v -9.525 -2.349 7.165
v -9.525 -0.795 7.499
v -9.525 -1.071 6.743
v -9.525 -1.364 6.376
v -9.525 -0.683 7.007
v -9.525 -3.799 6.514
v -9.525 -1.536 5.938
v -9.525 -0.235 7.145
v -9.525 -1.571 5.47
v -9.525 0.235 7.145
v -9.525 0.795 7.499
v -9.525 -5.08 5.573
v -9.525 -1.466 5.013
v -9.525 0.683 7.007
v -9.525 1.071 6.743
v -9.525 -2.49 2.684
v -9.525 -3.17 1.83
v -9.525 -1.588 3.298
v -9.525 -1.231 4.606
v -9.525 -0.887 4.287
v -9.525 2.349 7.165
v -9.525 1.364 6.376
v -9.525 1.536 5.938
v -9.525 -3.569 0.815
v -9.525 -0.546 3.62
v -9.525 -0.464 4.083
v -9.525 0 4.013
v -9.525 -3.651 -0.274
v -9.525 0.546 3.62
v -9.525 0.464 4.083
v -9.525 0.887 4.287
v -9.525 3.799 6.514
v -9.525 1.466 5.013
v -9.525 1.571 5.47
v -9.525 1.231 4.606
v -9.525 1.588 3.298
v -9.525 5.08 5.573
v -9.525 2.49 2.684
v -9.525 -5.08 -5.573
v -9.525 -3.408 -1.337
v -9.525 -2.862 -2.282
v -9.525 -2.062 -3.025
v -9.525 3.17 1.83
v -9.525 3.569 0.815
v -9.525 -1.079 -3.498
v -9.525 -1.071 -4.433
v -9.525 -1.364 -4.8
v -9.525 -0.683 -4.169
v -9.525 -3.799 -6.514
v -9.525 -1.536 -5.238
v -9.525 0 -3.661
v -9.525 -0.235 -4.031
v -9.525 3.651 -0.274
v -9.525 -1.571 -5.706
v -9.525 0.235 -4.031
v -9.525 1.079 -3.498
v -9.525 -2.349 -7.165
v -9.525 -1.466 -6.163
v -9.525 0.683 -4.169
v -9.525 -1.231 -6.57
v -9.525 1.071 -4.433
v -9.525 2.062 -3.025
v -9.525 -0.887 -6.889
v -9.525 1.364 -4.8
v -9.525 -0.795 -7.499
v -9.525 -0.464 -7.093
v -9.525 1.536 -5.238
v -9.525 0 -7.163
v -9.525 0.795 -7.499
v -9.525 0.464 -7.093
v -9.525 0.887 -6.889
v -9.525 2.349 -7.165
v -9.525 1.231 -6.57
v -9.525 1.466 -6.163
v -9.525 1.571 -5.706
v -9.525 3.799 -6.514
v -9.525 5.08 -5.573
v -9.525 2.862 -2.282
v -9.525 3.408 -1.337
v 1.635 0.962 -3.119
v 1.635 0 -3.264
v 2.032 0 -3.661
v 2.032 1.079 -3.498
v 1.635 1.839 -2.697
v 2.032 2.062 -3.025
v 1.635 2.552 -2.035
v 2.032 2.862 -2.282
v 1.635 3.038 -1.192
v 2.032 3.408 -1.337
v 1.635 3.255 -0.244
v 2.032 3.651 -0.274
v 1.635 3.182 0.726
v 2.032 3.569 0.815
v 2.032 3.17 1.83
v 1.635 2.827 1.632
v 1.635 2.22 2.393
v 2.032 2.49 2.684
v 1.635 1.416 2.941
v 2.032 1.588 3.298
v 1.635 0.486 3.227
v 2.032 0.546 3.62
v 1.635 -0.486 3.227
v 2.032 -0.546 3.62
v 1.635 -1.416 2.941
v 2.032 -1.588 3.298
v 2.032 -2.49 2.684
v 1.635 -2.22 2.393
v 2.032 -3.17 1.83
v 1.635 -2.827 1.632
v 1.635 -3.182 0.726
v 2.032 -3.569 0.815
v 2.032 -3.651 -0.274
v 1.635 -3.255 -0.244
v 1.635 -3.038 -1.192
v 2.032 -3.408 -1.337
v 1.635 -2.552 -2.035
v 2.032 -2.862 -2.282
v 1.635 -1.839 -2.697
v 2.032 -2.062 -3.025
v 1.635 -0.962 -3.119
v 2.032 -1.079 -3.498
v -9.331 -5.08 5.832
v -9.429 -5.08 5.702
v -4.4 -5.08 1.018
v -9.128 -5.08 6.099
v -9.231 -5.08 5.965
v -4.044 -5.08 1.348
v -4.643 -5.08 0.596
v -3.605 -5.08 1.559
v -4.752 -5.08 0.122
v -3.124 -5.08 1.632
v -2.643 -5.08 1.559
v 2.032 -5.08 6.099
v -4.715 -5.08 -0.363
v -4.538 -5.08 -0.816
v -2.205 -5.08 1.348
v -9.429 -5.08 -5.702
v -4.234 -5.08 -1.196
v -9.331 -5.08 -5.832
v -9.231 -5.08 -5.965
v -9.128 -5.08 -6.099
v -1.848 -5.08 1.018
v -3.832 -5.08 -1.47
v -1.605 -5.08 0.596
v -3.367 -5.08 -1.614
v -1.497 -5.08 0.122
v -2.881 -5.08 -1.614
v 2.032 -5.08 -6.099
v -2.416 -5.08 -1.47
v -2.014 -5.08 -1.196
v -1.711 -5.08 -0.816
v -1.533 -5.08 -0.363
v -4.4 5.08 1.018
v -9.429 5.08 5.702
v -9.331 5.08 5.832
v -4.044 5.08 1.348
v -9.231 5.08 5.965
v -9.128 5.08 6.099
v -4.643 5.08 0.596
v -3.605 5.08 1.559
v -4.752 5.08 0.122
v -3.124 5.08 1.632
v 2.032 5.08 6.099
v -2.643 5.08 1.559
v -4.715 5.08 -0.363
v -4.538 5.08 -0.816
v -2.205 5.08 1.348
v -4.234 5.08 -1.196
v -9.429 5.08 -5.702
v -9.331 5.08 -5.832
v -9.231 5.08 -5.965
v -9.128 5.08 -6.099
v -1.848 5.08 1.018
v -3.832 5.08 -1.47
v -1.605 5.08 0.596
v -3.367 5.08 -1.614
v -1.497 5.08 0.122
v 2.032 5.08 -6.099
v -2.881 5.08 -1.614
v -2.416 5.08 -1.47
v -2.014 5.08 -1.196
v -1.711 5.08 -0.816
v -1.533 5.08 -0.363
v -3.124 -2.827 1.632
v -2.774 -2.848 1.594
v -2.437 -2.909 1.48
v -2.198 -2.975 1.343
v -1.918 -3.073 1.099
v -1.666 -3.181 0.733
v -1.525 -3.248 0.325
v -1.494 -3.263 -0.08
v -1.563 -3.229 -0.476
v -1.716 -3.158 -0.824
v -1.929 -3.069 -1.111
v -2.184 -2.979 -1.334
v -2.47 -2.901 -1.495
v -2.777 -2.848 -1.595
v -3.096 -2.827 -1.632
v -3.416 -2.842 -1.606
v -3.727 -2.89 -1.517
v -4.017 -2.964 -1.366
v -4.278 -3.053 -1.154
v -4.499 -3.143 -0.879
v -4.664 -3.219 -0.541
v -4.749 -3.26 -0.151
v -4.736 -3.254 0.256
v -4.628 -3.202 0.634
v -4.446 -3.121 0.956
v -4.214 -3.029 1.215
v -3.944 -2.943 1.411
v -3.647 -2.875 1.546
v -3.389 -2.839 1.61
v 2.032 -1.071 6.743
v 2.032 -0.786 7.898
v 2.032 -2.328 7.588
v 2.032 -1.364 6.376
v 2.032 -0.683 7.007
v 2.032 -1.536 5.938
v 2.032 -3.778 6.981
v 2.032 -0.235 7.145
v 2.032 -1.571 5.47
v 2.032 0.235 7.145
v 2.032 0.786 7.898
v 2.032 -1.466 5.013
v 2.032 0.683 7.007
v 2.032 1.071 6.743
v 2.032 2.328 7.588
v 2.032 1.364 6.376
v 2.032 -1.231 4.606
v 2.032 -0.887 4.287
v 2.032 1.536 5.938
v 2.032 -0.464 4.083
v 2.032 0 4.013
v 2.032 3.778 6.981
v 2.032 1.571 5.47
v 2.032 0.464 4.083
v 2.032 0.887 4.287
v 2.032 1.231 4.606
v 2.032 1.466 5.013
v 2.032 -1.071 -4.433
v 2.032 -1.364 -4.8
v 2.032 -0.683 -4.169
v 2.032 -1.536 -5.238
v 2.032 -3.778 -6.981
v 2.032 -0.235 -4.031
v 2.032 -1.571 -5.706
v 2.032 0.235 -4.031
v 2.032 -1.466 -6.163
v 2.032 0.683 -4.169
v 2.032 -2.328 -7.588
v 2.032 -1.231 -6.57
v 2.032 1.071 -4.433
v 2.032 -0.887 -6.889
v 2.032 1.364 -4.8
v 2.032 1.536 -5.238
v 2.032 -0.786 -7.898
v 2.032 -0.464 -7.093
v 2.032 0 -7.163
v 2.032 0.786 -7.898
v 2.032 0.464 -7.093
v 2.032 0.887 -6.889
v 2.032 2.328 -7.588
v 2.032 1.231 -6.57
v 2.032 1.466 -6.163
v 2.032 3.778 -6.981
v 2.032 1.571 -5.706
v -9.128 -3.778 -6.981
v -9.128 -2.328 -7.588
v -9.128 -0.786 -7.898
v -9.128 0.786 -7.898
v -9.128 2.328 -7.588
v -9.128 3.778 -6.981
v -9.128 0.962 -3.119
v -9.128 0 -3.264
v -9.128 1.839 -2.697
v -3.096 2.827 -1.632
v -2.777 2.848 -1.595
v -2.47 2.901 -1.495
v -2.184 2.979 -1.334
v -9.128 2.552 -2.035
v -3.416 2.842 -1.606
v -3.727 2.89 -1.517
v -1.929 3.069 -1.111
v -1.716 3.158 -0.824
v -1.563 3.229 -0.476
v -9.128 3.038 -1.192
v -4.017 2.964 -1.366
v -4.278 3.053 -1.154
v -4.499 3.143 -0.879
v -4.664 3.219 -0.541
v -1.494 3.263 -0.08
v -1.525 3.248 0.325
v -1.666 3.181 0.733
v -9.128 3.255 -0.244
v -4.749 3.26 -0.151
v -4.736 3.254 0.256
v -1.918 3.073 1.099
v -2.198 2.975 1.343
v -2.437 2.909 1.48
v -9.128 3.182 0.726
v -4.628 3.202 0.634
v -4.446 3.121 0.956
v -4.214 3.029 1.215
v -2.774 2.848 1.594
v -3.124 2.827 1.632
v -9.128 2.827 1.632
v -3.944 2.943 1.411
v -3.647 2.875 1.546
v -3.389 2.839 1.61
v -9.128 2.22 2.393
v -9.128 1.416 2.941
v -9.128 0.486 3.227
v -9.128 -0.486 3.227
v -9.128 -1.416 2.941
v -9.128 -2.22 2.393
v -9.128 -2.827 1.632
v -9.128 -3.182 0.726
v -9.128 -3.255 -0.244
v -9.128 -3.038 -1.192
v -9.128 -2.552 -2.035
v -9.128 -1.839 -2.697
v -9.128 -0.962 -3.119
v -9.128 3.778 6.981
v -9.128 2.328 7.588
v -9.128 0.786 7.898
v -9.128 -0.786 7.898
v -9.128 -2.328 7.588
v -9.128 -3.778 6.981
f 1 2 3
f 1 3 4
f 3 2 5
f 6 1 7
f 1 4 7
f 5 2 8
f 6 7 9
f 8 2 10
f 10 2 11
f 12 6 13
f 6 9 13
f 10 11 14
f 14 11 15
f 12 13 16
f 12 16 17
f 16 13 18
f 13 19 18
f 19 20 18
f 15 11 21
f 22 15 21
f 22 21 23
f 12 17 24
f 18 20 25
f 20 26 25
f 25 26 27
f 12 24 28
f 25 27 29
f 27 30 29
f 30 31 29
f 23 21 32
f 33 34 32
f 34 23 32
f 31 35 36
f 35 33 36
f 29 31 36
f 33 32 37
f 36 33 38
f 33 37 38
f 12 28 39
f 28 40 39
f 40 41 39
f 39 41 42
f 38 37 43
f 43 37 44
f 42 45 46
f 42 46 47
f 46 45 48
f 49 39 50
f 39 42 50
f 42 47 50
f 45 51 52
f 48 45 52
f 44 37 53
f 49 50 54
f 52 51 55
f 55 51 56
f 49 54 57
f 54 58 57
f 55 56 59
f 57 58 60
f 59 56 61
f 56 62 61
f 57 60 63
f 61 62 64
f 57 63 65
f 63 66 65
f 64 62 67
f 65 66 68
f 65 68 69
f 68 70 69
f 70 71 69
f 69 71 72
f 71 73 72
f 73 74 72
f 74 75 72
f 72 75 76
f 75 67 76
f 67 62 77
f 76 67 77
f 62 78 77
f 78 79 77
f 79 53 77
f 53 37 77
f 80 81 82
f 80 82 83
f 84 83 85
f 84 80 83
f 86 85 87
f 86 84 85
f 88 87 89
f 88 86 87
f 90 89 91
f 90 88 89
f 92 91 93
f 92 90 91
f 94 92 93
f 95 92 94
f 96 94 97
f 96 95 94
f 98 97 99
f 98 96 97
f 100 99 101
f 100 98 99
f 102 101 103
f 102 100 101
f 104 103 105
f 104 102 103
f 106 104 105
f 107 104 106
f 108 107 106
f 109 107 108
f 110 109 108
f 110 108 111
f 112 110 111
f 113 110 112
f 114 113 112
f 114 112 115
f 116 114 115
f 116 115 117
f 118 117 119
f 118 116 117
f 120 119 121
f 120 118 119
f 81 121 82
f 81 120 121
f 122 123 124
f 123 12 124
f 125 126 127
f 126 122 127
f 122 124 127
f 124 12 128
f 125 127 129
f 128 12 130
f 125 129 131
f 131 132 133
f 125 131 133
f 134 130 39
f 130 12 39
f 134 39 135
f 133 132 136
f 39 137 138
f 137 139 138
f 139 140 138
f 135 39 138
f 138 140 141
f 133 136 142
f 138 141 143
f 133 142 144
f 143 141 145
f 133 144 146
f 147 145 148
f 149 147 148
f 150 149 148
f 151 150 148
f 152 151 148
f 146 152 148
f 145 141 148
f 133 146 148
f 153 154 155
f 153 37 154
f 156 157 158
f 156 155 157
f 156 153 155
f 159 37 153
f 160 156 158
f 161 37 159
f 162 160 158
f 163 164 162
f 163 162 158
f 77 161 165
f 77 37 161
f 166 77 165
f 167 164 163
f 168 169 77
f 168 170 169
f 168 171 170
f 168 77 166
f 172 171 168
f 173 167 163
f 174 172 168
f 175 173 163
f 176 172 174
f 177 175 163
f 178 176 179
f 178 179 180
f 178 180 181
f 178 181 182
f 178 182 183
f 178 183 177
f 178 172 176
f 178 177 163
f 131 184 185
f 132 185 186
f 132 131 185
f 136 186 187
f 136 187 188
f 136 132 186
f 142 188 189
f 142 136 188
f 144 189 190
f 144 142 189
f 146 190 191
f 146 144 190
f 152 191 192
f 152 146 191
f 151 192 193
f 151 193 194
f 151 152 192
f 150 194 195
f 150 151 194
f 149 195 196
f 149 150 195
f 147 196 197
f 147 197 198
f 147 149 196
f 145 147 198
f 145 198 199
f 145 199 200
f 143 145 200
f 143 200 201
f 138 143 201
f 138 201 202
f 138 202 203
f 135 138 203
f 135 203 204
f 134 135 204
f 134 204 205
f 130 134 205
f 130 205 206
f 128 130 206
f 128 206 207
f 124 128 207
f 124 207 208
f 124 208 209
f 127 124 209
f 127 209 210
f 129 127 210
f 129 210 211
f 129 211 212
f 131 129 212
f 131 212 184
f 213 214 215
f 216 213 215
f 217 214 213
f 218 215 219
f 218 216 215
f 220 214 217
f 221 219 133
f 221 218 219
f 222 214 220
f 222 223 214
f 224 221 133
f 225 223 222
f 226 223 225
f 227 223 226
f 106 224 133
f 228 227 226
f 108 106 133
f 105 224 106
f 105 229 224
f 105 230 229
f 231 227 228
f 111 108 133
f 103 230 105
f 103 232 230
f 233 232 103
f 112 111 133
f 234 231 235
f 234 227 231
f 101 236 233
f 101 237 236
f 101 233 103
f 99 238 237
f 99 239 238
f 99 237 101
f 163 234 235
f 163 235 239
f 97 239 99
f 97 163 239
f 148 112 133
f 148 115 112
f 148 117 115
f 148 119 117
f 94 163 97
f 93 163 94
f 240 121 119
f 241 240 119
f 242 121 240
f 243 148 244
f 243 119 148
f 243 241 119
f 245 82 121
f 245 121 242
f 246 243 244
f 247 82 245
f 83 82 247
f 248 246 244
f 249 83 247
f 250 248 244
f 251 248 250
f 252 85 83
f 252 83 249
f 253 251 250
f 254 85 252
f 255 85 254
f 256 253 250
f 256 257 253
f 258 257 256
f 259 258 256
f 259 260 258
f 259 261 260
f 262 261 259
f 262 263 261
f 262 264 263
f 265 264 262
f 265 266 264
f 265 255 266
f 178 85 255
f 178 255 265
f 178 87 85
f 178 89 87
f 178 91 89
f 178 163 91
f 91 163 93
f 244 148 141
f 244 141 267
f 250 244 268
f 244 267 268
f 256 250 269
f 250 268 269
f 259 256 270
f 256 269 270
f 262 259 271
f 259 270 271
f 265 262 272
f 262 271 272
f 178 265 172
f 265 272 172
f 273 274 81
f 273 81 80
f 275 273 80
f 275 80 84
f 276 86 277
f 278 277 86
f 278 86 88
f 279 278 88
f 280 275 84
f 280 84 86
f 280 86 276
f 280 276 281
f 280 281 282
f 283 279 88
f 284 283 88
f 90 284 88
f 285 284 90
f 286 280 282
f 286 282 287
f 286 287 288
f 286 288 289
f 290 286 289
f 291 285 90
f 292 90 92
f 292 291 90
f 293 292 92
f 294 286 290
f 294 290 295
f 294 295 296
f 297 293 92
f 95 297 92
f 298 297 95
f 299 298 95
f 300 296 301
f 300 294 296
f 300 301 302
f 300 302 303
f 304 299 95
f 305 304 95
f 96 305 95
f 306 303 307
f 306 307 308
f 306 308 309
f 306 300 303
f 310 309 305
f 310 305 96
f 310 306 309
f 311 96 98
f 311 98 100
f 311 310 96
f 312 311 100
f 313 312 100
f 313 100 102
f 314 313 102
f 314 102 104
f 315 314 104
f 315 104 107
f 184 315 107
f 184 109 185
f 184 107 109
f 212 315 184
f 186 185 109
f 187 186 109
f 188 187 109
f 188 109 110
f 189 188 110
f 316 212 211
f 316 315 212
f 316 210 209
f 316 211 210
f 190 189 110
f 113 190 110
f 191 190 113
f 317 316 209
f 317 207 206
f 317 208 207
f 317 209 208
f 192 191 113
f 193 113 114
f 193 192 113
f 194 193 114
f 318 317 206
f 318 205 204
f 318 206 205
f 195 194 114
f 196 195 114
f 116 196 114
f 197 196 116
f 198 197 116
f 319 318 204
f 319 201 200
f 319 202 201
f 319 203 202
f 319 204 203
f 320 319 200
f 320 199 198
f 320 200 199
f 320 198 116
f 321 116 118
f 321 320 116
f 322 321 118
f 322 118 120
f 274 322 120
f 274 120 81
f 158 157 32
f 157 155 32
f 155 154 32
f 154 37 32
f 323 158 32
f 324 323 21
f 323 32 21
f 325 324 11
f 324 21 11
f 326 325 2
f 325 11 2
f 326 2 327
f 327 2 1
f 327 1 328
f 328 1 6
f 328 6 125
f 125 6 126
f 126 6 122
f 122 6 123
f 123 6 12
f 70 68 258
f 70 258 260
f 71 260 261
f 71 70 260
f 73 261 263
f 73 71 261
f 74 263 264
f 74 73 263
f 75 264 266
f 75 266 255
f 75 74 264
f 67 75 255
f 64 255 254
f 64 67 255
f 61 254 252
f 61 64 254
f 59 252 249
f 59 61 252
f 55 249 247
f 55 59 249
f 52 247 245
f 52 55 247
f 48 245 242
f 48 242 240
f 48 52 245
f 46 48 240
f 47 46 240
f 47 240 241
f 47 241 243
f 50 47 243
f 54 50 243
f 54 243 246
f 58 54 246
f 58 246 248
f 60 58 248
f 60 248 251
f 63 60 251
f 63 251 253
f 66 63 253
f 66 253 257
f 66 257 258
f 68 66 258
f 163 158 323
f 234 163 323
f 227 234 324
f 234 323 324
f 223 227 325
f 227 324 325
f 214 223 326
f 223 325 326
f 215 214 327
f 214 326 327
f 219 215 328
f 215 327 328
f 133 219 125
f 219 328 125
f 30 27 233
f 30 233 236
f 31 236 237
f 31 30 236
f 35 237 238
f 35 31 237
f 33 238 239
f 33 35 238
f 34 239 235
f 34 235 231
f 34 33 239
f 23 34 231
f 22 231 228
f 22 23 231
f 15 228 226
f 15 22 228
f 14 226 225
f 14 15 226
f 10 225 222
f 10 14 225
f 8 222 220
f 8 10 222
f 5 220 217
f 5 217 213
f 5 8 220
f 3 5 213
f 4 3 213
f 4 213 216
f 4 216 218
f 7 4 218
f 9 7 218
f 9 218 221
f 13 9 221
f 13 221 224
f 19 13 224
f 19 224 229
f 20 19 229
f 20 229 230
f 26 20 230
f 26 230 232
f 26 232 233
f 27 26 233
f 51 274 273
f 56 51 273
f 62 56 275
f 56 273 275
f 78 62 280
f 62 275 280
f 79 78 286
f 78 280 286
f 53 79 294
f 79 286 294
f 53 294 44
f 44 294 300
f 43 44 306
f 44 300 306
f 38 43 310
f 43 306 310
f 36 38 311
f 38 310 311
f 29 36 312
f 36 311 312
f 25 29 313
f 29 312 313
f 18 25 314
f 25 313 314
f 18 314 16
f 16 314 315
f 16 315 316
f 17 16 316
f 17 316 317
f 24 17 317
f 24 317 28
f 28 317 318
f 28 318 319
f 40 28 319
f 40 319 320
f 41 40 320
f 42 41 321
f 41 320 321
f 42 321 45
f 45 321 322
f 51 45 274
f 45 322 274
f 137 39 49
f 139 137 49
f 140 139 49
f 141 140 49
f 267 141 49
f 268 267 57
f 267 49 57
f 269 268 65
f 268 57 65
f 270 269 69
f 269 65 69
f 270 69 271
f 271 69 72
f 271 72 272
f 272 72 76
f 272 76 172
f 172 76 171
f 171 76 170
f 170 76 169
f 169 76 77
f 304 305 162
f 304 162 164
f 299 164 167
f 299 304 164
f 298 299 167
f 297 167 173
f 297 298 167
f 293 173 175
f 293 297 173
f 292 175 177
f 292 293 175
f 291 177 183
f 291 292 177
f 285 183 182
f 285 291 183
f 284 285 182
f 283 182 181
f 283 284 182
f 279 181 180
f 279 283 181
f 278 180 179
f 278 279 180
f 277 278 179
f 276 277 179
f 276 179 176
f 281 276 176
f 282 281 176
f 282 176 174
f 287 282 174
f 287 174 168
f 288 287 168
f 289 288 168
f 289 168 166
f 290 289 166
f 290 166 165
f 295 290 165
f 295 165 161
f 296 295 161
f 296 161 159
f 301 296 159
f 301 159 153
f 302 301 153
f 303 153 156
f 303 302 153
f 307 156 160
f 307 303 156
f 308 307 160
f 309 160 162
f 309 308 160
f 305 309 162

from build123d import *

# Parameters (mm, degrees)
SKETCH1_R                                 = 7.9375
SKETCH1_R_2                               = 1.575
SKETCH1_R_3                               = 3.2639
INNER_SIDE_EXTRUDE_DEPTH                  = 2.032
OUTER_START                               = -9.525
SKETCH1_3_R                               = 7.9375
SKETCH1_3_R_2                             = 1.575
SKETCH1_3_R_3                             = 3.2639
OUTER_SIDE_EXTRUDE_DEPTH                  = 9.525
CLEVIS_PIN_CUT_DEPTH                      = 15.721869362
CLEVIS_PIN_CUT_DEPTH_BACK                 = 15.721869362
SKETCH2_R                                 = 1.63195
CHAMFER_SO_STEVE_DOESN_T_CUT_HIMSELF_SIZE = 0.396875
CUT_EXTRUDE1_DEPTH                        = 15.721869469
CUT_EXTRUDE1_DEPTH_BACK                   = 15.721869469
SKETCH4_W                                 = 19.05
SKETCH4_H                                 = 4.803702905


with BuildPart() as part:
    # Sketch1 → Inner Side Extrude (new body)
    with BuildSketch(Plane(origin=(0, 0, 0), x_dir=(0, 0, -1), z_dir=(1, 0, 0))):
        Circle(SKETCH1_R)
        with Locations((5.588, 0)):
            Circle(SKETCH1_R_2, mode=Mode.SUBTRACT)
        with Locations((-5.588, 0)):
            Circle(SKETCH1_R_2, mode=Mode.SUBTRACT)
        Circle(SKETCH1_R_3, mode=Mode.SUBTRACT)
    extrude(amount=INNER_SIDE_EXTRUDE_DEPTH)

    # Sketch1<3> → Outer Side Extrude (add)
    with BuildSketch(Plane(origin=(0, 0, 0), x_dir=(0, 0, -1), z_dir=(1, 0, 0)).offset(OUTER_START)):
        Circle(SKETCH1_3_R)
        with Locations((5.588, 0)):
            Circle(SKETCH1_3_R_2, mode=Mode.SUBTRACT)
        with Locations((-5.588, 0)):
            Circle(SKETCH1_3_R_2, mode=Mode.SUBTRACT)
        Circle(SKETCH1_3_R_3, mode=Mode.SUBTRACT)
    extrude(amount=OUTER_SIDE_EXTRUDE_DEPTH)

    # Sketch2 → Clevis Pin Cut (cut, two sides: drawn at the far end of the back side and taken through both)
    with BuildSketch(Plane(origin=(0, 0, 0), x_dir=(1, 0, 0), z_dir=(0, 1, 0)).offset(-CLEVIS_PIN_CUT_DEPTH_BACK)):
        with Locations((-3.1242, 0)):
            Circle(SKETCH2_R)
    extrude(amount=CLEVIS_PIN_CUT_DEPTH + CLEVIS_PIN_CUT_DEPTH_BACK, mode=Mode.SUBTRACT)

    # Chamfer so Steve Doesn't cut himself
    chamfer_so_steve_doesn_t_cut_himself_edges = [part.edges().sort_by_distance(p)[0] for p in [
        (-9.525, 0, 3.2639),
        (2.032, 0, 3.2639),
        (-9.525, 0, 7.9375),
    ]]
    chamfer(chamfer_so_steve_doesn_t_cut_himself_edges, length=CHAMFER_SO_STEVE_DOESN_T_CUT_HIMSELF_SIZE)

    # Sketch4 → Cut-Extrude1 (cut, two sides: drawn at the far end of the back side and taken through both)
    with BuildSketch(Plane.XY.offset(-CUT_EXTRUDE1_DEPTH_BACK)):
        with Locations((-3.1242, 7.481851452)):
            Rectangle(SKETCH4_W, SKETCH4_H)
        with Locations((-3.1242, -7.481851452)):
            Rectangle(SKETCH4_W, SKETCH4_H)
    extrude(amount=CUT_EXTRUDE1_DEPTH + CUT_EXTRUDE1_DEPTH_BACK, mode=Mode.SUBTRACT)


solid = part.part
